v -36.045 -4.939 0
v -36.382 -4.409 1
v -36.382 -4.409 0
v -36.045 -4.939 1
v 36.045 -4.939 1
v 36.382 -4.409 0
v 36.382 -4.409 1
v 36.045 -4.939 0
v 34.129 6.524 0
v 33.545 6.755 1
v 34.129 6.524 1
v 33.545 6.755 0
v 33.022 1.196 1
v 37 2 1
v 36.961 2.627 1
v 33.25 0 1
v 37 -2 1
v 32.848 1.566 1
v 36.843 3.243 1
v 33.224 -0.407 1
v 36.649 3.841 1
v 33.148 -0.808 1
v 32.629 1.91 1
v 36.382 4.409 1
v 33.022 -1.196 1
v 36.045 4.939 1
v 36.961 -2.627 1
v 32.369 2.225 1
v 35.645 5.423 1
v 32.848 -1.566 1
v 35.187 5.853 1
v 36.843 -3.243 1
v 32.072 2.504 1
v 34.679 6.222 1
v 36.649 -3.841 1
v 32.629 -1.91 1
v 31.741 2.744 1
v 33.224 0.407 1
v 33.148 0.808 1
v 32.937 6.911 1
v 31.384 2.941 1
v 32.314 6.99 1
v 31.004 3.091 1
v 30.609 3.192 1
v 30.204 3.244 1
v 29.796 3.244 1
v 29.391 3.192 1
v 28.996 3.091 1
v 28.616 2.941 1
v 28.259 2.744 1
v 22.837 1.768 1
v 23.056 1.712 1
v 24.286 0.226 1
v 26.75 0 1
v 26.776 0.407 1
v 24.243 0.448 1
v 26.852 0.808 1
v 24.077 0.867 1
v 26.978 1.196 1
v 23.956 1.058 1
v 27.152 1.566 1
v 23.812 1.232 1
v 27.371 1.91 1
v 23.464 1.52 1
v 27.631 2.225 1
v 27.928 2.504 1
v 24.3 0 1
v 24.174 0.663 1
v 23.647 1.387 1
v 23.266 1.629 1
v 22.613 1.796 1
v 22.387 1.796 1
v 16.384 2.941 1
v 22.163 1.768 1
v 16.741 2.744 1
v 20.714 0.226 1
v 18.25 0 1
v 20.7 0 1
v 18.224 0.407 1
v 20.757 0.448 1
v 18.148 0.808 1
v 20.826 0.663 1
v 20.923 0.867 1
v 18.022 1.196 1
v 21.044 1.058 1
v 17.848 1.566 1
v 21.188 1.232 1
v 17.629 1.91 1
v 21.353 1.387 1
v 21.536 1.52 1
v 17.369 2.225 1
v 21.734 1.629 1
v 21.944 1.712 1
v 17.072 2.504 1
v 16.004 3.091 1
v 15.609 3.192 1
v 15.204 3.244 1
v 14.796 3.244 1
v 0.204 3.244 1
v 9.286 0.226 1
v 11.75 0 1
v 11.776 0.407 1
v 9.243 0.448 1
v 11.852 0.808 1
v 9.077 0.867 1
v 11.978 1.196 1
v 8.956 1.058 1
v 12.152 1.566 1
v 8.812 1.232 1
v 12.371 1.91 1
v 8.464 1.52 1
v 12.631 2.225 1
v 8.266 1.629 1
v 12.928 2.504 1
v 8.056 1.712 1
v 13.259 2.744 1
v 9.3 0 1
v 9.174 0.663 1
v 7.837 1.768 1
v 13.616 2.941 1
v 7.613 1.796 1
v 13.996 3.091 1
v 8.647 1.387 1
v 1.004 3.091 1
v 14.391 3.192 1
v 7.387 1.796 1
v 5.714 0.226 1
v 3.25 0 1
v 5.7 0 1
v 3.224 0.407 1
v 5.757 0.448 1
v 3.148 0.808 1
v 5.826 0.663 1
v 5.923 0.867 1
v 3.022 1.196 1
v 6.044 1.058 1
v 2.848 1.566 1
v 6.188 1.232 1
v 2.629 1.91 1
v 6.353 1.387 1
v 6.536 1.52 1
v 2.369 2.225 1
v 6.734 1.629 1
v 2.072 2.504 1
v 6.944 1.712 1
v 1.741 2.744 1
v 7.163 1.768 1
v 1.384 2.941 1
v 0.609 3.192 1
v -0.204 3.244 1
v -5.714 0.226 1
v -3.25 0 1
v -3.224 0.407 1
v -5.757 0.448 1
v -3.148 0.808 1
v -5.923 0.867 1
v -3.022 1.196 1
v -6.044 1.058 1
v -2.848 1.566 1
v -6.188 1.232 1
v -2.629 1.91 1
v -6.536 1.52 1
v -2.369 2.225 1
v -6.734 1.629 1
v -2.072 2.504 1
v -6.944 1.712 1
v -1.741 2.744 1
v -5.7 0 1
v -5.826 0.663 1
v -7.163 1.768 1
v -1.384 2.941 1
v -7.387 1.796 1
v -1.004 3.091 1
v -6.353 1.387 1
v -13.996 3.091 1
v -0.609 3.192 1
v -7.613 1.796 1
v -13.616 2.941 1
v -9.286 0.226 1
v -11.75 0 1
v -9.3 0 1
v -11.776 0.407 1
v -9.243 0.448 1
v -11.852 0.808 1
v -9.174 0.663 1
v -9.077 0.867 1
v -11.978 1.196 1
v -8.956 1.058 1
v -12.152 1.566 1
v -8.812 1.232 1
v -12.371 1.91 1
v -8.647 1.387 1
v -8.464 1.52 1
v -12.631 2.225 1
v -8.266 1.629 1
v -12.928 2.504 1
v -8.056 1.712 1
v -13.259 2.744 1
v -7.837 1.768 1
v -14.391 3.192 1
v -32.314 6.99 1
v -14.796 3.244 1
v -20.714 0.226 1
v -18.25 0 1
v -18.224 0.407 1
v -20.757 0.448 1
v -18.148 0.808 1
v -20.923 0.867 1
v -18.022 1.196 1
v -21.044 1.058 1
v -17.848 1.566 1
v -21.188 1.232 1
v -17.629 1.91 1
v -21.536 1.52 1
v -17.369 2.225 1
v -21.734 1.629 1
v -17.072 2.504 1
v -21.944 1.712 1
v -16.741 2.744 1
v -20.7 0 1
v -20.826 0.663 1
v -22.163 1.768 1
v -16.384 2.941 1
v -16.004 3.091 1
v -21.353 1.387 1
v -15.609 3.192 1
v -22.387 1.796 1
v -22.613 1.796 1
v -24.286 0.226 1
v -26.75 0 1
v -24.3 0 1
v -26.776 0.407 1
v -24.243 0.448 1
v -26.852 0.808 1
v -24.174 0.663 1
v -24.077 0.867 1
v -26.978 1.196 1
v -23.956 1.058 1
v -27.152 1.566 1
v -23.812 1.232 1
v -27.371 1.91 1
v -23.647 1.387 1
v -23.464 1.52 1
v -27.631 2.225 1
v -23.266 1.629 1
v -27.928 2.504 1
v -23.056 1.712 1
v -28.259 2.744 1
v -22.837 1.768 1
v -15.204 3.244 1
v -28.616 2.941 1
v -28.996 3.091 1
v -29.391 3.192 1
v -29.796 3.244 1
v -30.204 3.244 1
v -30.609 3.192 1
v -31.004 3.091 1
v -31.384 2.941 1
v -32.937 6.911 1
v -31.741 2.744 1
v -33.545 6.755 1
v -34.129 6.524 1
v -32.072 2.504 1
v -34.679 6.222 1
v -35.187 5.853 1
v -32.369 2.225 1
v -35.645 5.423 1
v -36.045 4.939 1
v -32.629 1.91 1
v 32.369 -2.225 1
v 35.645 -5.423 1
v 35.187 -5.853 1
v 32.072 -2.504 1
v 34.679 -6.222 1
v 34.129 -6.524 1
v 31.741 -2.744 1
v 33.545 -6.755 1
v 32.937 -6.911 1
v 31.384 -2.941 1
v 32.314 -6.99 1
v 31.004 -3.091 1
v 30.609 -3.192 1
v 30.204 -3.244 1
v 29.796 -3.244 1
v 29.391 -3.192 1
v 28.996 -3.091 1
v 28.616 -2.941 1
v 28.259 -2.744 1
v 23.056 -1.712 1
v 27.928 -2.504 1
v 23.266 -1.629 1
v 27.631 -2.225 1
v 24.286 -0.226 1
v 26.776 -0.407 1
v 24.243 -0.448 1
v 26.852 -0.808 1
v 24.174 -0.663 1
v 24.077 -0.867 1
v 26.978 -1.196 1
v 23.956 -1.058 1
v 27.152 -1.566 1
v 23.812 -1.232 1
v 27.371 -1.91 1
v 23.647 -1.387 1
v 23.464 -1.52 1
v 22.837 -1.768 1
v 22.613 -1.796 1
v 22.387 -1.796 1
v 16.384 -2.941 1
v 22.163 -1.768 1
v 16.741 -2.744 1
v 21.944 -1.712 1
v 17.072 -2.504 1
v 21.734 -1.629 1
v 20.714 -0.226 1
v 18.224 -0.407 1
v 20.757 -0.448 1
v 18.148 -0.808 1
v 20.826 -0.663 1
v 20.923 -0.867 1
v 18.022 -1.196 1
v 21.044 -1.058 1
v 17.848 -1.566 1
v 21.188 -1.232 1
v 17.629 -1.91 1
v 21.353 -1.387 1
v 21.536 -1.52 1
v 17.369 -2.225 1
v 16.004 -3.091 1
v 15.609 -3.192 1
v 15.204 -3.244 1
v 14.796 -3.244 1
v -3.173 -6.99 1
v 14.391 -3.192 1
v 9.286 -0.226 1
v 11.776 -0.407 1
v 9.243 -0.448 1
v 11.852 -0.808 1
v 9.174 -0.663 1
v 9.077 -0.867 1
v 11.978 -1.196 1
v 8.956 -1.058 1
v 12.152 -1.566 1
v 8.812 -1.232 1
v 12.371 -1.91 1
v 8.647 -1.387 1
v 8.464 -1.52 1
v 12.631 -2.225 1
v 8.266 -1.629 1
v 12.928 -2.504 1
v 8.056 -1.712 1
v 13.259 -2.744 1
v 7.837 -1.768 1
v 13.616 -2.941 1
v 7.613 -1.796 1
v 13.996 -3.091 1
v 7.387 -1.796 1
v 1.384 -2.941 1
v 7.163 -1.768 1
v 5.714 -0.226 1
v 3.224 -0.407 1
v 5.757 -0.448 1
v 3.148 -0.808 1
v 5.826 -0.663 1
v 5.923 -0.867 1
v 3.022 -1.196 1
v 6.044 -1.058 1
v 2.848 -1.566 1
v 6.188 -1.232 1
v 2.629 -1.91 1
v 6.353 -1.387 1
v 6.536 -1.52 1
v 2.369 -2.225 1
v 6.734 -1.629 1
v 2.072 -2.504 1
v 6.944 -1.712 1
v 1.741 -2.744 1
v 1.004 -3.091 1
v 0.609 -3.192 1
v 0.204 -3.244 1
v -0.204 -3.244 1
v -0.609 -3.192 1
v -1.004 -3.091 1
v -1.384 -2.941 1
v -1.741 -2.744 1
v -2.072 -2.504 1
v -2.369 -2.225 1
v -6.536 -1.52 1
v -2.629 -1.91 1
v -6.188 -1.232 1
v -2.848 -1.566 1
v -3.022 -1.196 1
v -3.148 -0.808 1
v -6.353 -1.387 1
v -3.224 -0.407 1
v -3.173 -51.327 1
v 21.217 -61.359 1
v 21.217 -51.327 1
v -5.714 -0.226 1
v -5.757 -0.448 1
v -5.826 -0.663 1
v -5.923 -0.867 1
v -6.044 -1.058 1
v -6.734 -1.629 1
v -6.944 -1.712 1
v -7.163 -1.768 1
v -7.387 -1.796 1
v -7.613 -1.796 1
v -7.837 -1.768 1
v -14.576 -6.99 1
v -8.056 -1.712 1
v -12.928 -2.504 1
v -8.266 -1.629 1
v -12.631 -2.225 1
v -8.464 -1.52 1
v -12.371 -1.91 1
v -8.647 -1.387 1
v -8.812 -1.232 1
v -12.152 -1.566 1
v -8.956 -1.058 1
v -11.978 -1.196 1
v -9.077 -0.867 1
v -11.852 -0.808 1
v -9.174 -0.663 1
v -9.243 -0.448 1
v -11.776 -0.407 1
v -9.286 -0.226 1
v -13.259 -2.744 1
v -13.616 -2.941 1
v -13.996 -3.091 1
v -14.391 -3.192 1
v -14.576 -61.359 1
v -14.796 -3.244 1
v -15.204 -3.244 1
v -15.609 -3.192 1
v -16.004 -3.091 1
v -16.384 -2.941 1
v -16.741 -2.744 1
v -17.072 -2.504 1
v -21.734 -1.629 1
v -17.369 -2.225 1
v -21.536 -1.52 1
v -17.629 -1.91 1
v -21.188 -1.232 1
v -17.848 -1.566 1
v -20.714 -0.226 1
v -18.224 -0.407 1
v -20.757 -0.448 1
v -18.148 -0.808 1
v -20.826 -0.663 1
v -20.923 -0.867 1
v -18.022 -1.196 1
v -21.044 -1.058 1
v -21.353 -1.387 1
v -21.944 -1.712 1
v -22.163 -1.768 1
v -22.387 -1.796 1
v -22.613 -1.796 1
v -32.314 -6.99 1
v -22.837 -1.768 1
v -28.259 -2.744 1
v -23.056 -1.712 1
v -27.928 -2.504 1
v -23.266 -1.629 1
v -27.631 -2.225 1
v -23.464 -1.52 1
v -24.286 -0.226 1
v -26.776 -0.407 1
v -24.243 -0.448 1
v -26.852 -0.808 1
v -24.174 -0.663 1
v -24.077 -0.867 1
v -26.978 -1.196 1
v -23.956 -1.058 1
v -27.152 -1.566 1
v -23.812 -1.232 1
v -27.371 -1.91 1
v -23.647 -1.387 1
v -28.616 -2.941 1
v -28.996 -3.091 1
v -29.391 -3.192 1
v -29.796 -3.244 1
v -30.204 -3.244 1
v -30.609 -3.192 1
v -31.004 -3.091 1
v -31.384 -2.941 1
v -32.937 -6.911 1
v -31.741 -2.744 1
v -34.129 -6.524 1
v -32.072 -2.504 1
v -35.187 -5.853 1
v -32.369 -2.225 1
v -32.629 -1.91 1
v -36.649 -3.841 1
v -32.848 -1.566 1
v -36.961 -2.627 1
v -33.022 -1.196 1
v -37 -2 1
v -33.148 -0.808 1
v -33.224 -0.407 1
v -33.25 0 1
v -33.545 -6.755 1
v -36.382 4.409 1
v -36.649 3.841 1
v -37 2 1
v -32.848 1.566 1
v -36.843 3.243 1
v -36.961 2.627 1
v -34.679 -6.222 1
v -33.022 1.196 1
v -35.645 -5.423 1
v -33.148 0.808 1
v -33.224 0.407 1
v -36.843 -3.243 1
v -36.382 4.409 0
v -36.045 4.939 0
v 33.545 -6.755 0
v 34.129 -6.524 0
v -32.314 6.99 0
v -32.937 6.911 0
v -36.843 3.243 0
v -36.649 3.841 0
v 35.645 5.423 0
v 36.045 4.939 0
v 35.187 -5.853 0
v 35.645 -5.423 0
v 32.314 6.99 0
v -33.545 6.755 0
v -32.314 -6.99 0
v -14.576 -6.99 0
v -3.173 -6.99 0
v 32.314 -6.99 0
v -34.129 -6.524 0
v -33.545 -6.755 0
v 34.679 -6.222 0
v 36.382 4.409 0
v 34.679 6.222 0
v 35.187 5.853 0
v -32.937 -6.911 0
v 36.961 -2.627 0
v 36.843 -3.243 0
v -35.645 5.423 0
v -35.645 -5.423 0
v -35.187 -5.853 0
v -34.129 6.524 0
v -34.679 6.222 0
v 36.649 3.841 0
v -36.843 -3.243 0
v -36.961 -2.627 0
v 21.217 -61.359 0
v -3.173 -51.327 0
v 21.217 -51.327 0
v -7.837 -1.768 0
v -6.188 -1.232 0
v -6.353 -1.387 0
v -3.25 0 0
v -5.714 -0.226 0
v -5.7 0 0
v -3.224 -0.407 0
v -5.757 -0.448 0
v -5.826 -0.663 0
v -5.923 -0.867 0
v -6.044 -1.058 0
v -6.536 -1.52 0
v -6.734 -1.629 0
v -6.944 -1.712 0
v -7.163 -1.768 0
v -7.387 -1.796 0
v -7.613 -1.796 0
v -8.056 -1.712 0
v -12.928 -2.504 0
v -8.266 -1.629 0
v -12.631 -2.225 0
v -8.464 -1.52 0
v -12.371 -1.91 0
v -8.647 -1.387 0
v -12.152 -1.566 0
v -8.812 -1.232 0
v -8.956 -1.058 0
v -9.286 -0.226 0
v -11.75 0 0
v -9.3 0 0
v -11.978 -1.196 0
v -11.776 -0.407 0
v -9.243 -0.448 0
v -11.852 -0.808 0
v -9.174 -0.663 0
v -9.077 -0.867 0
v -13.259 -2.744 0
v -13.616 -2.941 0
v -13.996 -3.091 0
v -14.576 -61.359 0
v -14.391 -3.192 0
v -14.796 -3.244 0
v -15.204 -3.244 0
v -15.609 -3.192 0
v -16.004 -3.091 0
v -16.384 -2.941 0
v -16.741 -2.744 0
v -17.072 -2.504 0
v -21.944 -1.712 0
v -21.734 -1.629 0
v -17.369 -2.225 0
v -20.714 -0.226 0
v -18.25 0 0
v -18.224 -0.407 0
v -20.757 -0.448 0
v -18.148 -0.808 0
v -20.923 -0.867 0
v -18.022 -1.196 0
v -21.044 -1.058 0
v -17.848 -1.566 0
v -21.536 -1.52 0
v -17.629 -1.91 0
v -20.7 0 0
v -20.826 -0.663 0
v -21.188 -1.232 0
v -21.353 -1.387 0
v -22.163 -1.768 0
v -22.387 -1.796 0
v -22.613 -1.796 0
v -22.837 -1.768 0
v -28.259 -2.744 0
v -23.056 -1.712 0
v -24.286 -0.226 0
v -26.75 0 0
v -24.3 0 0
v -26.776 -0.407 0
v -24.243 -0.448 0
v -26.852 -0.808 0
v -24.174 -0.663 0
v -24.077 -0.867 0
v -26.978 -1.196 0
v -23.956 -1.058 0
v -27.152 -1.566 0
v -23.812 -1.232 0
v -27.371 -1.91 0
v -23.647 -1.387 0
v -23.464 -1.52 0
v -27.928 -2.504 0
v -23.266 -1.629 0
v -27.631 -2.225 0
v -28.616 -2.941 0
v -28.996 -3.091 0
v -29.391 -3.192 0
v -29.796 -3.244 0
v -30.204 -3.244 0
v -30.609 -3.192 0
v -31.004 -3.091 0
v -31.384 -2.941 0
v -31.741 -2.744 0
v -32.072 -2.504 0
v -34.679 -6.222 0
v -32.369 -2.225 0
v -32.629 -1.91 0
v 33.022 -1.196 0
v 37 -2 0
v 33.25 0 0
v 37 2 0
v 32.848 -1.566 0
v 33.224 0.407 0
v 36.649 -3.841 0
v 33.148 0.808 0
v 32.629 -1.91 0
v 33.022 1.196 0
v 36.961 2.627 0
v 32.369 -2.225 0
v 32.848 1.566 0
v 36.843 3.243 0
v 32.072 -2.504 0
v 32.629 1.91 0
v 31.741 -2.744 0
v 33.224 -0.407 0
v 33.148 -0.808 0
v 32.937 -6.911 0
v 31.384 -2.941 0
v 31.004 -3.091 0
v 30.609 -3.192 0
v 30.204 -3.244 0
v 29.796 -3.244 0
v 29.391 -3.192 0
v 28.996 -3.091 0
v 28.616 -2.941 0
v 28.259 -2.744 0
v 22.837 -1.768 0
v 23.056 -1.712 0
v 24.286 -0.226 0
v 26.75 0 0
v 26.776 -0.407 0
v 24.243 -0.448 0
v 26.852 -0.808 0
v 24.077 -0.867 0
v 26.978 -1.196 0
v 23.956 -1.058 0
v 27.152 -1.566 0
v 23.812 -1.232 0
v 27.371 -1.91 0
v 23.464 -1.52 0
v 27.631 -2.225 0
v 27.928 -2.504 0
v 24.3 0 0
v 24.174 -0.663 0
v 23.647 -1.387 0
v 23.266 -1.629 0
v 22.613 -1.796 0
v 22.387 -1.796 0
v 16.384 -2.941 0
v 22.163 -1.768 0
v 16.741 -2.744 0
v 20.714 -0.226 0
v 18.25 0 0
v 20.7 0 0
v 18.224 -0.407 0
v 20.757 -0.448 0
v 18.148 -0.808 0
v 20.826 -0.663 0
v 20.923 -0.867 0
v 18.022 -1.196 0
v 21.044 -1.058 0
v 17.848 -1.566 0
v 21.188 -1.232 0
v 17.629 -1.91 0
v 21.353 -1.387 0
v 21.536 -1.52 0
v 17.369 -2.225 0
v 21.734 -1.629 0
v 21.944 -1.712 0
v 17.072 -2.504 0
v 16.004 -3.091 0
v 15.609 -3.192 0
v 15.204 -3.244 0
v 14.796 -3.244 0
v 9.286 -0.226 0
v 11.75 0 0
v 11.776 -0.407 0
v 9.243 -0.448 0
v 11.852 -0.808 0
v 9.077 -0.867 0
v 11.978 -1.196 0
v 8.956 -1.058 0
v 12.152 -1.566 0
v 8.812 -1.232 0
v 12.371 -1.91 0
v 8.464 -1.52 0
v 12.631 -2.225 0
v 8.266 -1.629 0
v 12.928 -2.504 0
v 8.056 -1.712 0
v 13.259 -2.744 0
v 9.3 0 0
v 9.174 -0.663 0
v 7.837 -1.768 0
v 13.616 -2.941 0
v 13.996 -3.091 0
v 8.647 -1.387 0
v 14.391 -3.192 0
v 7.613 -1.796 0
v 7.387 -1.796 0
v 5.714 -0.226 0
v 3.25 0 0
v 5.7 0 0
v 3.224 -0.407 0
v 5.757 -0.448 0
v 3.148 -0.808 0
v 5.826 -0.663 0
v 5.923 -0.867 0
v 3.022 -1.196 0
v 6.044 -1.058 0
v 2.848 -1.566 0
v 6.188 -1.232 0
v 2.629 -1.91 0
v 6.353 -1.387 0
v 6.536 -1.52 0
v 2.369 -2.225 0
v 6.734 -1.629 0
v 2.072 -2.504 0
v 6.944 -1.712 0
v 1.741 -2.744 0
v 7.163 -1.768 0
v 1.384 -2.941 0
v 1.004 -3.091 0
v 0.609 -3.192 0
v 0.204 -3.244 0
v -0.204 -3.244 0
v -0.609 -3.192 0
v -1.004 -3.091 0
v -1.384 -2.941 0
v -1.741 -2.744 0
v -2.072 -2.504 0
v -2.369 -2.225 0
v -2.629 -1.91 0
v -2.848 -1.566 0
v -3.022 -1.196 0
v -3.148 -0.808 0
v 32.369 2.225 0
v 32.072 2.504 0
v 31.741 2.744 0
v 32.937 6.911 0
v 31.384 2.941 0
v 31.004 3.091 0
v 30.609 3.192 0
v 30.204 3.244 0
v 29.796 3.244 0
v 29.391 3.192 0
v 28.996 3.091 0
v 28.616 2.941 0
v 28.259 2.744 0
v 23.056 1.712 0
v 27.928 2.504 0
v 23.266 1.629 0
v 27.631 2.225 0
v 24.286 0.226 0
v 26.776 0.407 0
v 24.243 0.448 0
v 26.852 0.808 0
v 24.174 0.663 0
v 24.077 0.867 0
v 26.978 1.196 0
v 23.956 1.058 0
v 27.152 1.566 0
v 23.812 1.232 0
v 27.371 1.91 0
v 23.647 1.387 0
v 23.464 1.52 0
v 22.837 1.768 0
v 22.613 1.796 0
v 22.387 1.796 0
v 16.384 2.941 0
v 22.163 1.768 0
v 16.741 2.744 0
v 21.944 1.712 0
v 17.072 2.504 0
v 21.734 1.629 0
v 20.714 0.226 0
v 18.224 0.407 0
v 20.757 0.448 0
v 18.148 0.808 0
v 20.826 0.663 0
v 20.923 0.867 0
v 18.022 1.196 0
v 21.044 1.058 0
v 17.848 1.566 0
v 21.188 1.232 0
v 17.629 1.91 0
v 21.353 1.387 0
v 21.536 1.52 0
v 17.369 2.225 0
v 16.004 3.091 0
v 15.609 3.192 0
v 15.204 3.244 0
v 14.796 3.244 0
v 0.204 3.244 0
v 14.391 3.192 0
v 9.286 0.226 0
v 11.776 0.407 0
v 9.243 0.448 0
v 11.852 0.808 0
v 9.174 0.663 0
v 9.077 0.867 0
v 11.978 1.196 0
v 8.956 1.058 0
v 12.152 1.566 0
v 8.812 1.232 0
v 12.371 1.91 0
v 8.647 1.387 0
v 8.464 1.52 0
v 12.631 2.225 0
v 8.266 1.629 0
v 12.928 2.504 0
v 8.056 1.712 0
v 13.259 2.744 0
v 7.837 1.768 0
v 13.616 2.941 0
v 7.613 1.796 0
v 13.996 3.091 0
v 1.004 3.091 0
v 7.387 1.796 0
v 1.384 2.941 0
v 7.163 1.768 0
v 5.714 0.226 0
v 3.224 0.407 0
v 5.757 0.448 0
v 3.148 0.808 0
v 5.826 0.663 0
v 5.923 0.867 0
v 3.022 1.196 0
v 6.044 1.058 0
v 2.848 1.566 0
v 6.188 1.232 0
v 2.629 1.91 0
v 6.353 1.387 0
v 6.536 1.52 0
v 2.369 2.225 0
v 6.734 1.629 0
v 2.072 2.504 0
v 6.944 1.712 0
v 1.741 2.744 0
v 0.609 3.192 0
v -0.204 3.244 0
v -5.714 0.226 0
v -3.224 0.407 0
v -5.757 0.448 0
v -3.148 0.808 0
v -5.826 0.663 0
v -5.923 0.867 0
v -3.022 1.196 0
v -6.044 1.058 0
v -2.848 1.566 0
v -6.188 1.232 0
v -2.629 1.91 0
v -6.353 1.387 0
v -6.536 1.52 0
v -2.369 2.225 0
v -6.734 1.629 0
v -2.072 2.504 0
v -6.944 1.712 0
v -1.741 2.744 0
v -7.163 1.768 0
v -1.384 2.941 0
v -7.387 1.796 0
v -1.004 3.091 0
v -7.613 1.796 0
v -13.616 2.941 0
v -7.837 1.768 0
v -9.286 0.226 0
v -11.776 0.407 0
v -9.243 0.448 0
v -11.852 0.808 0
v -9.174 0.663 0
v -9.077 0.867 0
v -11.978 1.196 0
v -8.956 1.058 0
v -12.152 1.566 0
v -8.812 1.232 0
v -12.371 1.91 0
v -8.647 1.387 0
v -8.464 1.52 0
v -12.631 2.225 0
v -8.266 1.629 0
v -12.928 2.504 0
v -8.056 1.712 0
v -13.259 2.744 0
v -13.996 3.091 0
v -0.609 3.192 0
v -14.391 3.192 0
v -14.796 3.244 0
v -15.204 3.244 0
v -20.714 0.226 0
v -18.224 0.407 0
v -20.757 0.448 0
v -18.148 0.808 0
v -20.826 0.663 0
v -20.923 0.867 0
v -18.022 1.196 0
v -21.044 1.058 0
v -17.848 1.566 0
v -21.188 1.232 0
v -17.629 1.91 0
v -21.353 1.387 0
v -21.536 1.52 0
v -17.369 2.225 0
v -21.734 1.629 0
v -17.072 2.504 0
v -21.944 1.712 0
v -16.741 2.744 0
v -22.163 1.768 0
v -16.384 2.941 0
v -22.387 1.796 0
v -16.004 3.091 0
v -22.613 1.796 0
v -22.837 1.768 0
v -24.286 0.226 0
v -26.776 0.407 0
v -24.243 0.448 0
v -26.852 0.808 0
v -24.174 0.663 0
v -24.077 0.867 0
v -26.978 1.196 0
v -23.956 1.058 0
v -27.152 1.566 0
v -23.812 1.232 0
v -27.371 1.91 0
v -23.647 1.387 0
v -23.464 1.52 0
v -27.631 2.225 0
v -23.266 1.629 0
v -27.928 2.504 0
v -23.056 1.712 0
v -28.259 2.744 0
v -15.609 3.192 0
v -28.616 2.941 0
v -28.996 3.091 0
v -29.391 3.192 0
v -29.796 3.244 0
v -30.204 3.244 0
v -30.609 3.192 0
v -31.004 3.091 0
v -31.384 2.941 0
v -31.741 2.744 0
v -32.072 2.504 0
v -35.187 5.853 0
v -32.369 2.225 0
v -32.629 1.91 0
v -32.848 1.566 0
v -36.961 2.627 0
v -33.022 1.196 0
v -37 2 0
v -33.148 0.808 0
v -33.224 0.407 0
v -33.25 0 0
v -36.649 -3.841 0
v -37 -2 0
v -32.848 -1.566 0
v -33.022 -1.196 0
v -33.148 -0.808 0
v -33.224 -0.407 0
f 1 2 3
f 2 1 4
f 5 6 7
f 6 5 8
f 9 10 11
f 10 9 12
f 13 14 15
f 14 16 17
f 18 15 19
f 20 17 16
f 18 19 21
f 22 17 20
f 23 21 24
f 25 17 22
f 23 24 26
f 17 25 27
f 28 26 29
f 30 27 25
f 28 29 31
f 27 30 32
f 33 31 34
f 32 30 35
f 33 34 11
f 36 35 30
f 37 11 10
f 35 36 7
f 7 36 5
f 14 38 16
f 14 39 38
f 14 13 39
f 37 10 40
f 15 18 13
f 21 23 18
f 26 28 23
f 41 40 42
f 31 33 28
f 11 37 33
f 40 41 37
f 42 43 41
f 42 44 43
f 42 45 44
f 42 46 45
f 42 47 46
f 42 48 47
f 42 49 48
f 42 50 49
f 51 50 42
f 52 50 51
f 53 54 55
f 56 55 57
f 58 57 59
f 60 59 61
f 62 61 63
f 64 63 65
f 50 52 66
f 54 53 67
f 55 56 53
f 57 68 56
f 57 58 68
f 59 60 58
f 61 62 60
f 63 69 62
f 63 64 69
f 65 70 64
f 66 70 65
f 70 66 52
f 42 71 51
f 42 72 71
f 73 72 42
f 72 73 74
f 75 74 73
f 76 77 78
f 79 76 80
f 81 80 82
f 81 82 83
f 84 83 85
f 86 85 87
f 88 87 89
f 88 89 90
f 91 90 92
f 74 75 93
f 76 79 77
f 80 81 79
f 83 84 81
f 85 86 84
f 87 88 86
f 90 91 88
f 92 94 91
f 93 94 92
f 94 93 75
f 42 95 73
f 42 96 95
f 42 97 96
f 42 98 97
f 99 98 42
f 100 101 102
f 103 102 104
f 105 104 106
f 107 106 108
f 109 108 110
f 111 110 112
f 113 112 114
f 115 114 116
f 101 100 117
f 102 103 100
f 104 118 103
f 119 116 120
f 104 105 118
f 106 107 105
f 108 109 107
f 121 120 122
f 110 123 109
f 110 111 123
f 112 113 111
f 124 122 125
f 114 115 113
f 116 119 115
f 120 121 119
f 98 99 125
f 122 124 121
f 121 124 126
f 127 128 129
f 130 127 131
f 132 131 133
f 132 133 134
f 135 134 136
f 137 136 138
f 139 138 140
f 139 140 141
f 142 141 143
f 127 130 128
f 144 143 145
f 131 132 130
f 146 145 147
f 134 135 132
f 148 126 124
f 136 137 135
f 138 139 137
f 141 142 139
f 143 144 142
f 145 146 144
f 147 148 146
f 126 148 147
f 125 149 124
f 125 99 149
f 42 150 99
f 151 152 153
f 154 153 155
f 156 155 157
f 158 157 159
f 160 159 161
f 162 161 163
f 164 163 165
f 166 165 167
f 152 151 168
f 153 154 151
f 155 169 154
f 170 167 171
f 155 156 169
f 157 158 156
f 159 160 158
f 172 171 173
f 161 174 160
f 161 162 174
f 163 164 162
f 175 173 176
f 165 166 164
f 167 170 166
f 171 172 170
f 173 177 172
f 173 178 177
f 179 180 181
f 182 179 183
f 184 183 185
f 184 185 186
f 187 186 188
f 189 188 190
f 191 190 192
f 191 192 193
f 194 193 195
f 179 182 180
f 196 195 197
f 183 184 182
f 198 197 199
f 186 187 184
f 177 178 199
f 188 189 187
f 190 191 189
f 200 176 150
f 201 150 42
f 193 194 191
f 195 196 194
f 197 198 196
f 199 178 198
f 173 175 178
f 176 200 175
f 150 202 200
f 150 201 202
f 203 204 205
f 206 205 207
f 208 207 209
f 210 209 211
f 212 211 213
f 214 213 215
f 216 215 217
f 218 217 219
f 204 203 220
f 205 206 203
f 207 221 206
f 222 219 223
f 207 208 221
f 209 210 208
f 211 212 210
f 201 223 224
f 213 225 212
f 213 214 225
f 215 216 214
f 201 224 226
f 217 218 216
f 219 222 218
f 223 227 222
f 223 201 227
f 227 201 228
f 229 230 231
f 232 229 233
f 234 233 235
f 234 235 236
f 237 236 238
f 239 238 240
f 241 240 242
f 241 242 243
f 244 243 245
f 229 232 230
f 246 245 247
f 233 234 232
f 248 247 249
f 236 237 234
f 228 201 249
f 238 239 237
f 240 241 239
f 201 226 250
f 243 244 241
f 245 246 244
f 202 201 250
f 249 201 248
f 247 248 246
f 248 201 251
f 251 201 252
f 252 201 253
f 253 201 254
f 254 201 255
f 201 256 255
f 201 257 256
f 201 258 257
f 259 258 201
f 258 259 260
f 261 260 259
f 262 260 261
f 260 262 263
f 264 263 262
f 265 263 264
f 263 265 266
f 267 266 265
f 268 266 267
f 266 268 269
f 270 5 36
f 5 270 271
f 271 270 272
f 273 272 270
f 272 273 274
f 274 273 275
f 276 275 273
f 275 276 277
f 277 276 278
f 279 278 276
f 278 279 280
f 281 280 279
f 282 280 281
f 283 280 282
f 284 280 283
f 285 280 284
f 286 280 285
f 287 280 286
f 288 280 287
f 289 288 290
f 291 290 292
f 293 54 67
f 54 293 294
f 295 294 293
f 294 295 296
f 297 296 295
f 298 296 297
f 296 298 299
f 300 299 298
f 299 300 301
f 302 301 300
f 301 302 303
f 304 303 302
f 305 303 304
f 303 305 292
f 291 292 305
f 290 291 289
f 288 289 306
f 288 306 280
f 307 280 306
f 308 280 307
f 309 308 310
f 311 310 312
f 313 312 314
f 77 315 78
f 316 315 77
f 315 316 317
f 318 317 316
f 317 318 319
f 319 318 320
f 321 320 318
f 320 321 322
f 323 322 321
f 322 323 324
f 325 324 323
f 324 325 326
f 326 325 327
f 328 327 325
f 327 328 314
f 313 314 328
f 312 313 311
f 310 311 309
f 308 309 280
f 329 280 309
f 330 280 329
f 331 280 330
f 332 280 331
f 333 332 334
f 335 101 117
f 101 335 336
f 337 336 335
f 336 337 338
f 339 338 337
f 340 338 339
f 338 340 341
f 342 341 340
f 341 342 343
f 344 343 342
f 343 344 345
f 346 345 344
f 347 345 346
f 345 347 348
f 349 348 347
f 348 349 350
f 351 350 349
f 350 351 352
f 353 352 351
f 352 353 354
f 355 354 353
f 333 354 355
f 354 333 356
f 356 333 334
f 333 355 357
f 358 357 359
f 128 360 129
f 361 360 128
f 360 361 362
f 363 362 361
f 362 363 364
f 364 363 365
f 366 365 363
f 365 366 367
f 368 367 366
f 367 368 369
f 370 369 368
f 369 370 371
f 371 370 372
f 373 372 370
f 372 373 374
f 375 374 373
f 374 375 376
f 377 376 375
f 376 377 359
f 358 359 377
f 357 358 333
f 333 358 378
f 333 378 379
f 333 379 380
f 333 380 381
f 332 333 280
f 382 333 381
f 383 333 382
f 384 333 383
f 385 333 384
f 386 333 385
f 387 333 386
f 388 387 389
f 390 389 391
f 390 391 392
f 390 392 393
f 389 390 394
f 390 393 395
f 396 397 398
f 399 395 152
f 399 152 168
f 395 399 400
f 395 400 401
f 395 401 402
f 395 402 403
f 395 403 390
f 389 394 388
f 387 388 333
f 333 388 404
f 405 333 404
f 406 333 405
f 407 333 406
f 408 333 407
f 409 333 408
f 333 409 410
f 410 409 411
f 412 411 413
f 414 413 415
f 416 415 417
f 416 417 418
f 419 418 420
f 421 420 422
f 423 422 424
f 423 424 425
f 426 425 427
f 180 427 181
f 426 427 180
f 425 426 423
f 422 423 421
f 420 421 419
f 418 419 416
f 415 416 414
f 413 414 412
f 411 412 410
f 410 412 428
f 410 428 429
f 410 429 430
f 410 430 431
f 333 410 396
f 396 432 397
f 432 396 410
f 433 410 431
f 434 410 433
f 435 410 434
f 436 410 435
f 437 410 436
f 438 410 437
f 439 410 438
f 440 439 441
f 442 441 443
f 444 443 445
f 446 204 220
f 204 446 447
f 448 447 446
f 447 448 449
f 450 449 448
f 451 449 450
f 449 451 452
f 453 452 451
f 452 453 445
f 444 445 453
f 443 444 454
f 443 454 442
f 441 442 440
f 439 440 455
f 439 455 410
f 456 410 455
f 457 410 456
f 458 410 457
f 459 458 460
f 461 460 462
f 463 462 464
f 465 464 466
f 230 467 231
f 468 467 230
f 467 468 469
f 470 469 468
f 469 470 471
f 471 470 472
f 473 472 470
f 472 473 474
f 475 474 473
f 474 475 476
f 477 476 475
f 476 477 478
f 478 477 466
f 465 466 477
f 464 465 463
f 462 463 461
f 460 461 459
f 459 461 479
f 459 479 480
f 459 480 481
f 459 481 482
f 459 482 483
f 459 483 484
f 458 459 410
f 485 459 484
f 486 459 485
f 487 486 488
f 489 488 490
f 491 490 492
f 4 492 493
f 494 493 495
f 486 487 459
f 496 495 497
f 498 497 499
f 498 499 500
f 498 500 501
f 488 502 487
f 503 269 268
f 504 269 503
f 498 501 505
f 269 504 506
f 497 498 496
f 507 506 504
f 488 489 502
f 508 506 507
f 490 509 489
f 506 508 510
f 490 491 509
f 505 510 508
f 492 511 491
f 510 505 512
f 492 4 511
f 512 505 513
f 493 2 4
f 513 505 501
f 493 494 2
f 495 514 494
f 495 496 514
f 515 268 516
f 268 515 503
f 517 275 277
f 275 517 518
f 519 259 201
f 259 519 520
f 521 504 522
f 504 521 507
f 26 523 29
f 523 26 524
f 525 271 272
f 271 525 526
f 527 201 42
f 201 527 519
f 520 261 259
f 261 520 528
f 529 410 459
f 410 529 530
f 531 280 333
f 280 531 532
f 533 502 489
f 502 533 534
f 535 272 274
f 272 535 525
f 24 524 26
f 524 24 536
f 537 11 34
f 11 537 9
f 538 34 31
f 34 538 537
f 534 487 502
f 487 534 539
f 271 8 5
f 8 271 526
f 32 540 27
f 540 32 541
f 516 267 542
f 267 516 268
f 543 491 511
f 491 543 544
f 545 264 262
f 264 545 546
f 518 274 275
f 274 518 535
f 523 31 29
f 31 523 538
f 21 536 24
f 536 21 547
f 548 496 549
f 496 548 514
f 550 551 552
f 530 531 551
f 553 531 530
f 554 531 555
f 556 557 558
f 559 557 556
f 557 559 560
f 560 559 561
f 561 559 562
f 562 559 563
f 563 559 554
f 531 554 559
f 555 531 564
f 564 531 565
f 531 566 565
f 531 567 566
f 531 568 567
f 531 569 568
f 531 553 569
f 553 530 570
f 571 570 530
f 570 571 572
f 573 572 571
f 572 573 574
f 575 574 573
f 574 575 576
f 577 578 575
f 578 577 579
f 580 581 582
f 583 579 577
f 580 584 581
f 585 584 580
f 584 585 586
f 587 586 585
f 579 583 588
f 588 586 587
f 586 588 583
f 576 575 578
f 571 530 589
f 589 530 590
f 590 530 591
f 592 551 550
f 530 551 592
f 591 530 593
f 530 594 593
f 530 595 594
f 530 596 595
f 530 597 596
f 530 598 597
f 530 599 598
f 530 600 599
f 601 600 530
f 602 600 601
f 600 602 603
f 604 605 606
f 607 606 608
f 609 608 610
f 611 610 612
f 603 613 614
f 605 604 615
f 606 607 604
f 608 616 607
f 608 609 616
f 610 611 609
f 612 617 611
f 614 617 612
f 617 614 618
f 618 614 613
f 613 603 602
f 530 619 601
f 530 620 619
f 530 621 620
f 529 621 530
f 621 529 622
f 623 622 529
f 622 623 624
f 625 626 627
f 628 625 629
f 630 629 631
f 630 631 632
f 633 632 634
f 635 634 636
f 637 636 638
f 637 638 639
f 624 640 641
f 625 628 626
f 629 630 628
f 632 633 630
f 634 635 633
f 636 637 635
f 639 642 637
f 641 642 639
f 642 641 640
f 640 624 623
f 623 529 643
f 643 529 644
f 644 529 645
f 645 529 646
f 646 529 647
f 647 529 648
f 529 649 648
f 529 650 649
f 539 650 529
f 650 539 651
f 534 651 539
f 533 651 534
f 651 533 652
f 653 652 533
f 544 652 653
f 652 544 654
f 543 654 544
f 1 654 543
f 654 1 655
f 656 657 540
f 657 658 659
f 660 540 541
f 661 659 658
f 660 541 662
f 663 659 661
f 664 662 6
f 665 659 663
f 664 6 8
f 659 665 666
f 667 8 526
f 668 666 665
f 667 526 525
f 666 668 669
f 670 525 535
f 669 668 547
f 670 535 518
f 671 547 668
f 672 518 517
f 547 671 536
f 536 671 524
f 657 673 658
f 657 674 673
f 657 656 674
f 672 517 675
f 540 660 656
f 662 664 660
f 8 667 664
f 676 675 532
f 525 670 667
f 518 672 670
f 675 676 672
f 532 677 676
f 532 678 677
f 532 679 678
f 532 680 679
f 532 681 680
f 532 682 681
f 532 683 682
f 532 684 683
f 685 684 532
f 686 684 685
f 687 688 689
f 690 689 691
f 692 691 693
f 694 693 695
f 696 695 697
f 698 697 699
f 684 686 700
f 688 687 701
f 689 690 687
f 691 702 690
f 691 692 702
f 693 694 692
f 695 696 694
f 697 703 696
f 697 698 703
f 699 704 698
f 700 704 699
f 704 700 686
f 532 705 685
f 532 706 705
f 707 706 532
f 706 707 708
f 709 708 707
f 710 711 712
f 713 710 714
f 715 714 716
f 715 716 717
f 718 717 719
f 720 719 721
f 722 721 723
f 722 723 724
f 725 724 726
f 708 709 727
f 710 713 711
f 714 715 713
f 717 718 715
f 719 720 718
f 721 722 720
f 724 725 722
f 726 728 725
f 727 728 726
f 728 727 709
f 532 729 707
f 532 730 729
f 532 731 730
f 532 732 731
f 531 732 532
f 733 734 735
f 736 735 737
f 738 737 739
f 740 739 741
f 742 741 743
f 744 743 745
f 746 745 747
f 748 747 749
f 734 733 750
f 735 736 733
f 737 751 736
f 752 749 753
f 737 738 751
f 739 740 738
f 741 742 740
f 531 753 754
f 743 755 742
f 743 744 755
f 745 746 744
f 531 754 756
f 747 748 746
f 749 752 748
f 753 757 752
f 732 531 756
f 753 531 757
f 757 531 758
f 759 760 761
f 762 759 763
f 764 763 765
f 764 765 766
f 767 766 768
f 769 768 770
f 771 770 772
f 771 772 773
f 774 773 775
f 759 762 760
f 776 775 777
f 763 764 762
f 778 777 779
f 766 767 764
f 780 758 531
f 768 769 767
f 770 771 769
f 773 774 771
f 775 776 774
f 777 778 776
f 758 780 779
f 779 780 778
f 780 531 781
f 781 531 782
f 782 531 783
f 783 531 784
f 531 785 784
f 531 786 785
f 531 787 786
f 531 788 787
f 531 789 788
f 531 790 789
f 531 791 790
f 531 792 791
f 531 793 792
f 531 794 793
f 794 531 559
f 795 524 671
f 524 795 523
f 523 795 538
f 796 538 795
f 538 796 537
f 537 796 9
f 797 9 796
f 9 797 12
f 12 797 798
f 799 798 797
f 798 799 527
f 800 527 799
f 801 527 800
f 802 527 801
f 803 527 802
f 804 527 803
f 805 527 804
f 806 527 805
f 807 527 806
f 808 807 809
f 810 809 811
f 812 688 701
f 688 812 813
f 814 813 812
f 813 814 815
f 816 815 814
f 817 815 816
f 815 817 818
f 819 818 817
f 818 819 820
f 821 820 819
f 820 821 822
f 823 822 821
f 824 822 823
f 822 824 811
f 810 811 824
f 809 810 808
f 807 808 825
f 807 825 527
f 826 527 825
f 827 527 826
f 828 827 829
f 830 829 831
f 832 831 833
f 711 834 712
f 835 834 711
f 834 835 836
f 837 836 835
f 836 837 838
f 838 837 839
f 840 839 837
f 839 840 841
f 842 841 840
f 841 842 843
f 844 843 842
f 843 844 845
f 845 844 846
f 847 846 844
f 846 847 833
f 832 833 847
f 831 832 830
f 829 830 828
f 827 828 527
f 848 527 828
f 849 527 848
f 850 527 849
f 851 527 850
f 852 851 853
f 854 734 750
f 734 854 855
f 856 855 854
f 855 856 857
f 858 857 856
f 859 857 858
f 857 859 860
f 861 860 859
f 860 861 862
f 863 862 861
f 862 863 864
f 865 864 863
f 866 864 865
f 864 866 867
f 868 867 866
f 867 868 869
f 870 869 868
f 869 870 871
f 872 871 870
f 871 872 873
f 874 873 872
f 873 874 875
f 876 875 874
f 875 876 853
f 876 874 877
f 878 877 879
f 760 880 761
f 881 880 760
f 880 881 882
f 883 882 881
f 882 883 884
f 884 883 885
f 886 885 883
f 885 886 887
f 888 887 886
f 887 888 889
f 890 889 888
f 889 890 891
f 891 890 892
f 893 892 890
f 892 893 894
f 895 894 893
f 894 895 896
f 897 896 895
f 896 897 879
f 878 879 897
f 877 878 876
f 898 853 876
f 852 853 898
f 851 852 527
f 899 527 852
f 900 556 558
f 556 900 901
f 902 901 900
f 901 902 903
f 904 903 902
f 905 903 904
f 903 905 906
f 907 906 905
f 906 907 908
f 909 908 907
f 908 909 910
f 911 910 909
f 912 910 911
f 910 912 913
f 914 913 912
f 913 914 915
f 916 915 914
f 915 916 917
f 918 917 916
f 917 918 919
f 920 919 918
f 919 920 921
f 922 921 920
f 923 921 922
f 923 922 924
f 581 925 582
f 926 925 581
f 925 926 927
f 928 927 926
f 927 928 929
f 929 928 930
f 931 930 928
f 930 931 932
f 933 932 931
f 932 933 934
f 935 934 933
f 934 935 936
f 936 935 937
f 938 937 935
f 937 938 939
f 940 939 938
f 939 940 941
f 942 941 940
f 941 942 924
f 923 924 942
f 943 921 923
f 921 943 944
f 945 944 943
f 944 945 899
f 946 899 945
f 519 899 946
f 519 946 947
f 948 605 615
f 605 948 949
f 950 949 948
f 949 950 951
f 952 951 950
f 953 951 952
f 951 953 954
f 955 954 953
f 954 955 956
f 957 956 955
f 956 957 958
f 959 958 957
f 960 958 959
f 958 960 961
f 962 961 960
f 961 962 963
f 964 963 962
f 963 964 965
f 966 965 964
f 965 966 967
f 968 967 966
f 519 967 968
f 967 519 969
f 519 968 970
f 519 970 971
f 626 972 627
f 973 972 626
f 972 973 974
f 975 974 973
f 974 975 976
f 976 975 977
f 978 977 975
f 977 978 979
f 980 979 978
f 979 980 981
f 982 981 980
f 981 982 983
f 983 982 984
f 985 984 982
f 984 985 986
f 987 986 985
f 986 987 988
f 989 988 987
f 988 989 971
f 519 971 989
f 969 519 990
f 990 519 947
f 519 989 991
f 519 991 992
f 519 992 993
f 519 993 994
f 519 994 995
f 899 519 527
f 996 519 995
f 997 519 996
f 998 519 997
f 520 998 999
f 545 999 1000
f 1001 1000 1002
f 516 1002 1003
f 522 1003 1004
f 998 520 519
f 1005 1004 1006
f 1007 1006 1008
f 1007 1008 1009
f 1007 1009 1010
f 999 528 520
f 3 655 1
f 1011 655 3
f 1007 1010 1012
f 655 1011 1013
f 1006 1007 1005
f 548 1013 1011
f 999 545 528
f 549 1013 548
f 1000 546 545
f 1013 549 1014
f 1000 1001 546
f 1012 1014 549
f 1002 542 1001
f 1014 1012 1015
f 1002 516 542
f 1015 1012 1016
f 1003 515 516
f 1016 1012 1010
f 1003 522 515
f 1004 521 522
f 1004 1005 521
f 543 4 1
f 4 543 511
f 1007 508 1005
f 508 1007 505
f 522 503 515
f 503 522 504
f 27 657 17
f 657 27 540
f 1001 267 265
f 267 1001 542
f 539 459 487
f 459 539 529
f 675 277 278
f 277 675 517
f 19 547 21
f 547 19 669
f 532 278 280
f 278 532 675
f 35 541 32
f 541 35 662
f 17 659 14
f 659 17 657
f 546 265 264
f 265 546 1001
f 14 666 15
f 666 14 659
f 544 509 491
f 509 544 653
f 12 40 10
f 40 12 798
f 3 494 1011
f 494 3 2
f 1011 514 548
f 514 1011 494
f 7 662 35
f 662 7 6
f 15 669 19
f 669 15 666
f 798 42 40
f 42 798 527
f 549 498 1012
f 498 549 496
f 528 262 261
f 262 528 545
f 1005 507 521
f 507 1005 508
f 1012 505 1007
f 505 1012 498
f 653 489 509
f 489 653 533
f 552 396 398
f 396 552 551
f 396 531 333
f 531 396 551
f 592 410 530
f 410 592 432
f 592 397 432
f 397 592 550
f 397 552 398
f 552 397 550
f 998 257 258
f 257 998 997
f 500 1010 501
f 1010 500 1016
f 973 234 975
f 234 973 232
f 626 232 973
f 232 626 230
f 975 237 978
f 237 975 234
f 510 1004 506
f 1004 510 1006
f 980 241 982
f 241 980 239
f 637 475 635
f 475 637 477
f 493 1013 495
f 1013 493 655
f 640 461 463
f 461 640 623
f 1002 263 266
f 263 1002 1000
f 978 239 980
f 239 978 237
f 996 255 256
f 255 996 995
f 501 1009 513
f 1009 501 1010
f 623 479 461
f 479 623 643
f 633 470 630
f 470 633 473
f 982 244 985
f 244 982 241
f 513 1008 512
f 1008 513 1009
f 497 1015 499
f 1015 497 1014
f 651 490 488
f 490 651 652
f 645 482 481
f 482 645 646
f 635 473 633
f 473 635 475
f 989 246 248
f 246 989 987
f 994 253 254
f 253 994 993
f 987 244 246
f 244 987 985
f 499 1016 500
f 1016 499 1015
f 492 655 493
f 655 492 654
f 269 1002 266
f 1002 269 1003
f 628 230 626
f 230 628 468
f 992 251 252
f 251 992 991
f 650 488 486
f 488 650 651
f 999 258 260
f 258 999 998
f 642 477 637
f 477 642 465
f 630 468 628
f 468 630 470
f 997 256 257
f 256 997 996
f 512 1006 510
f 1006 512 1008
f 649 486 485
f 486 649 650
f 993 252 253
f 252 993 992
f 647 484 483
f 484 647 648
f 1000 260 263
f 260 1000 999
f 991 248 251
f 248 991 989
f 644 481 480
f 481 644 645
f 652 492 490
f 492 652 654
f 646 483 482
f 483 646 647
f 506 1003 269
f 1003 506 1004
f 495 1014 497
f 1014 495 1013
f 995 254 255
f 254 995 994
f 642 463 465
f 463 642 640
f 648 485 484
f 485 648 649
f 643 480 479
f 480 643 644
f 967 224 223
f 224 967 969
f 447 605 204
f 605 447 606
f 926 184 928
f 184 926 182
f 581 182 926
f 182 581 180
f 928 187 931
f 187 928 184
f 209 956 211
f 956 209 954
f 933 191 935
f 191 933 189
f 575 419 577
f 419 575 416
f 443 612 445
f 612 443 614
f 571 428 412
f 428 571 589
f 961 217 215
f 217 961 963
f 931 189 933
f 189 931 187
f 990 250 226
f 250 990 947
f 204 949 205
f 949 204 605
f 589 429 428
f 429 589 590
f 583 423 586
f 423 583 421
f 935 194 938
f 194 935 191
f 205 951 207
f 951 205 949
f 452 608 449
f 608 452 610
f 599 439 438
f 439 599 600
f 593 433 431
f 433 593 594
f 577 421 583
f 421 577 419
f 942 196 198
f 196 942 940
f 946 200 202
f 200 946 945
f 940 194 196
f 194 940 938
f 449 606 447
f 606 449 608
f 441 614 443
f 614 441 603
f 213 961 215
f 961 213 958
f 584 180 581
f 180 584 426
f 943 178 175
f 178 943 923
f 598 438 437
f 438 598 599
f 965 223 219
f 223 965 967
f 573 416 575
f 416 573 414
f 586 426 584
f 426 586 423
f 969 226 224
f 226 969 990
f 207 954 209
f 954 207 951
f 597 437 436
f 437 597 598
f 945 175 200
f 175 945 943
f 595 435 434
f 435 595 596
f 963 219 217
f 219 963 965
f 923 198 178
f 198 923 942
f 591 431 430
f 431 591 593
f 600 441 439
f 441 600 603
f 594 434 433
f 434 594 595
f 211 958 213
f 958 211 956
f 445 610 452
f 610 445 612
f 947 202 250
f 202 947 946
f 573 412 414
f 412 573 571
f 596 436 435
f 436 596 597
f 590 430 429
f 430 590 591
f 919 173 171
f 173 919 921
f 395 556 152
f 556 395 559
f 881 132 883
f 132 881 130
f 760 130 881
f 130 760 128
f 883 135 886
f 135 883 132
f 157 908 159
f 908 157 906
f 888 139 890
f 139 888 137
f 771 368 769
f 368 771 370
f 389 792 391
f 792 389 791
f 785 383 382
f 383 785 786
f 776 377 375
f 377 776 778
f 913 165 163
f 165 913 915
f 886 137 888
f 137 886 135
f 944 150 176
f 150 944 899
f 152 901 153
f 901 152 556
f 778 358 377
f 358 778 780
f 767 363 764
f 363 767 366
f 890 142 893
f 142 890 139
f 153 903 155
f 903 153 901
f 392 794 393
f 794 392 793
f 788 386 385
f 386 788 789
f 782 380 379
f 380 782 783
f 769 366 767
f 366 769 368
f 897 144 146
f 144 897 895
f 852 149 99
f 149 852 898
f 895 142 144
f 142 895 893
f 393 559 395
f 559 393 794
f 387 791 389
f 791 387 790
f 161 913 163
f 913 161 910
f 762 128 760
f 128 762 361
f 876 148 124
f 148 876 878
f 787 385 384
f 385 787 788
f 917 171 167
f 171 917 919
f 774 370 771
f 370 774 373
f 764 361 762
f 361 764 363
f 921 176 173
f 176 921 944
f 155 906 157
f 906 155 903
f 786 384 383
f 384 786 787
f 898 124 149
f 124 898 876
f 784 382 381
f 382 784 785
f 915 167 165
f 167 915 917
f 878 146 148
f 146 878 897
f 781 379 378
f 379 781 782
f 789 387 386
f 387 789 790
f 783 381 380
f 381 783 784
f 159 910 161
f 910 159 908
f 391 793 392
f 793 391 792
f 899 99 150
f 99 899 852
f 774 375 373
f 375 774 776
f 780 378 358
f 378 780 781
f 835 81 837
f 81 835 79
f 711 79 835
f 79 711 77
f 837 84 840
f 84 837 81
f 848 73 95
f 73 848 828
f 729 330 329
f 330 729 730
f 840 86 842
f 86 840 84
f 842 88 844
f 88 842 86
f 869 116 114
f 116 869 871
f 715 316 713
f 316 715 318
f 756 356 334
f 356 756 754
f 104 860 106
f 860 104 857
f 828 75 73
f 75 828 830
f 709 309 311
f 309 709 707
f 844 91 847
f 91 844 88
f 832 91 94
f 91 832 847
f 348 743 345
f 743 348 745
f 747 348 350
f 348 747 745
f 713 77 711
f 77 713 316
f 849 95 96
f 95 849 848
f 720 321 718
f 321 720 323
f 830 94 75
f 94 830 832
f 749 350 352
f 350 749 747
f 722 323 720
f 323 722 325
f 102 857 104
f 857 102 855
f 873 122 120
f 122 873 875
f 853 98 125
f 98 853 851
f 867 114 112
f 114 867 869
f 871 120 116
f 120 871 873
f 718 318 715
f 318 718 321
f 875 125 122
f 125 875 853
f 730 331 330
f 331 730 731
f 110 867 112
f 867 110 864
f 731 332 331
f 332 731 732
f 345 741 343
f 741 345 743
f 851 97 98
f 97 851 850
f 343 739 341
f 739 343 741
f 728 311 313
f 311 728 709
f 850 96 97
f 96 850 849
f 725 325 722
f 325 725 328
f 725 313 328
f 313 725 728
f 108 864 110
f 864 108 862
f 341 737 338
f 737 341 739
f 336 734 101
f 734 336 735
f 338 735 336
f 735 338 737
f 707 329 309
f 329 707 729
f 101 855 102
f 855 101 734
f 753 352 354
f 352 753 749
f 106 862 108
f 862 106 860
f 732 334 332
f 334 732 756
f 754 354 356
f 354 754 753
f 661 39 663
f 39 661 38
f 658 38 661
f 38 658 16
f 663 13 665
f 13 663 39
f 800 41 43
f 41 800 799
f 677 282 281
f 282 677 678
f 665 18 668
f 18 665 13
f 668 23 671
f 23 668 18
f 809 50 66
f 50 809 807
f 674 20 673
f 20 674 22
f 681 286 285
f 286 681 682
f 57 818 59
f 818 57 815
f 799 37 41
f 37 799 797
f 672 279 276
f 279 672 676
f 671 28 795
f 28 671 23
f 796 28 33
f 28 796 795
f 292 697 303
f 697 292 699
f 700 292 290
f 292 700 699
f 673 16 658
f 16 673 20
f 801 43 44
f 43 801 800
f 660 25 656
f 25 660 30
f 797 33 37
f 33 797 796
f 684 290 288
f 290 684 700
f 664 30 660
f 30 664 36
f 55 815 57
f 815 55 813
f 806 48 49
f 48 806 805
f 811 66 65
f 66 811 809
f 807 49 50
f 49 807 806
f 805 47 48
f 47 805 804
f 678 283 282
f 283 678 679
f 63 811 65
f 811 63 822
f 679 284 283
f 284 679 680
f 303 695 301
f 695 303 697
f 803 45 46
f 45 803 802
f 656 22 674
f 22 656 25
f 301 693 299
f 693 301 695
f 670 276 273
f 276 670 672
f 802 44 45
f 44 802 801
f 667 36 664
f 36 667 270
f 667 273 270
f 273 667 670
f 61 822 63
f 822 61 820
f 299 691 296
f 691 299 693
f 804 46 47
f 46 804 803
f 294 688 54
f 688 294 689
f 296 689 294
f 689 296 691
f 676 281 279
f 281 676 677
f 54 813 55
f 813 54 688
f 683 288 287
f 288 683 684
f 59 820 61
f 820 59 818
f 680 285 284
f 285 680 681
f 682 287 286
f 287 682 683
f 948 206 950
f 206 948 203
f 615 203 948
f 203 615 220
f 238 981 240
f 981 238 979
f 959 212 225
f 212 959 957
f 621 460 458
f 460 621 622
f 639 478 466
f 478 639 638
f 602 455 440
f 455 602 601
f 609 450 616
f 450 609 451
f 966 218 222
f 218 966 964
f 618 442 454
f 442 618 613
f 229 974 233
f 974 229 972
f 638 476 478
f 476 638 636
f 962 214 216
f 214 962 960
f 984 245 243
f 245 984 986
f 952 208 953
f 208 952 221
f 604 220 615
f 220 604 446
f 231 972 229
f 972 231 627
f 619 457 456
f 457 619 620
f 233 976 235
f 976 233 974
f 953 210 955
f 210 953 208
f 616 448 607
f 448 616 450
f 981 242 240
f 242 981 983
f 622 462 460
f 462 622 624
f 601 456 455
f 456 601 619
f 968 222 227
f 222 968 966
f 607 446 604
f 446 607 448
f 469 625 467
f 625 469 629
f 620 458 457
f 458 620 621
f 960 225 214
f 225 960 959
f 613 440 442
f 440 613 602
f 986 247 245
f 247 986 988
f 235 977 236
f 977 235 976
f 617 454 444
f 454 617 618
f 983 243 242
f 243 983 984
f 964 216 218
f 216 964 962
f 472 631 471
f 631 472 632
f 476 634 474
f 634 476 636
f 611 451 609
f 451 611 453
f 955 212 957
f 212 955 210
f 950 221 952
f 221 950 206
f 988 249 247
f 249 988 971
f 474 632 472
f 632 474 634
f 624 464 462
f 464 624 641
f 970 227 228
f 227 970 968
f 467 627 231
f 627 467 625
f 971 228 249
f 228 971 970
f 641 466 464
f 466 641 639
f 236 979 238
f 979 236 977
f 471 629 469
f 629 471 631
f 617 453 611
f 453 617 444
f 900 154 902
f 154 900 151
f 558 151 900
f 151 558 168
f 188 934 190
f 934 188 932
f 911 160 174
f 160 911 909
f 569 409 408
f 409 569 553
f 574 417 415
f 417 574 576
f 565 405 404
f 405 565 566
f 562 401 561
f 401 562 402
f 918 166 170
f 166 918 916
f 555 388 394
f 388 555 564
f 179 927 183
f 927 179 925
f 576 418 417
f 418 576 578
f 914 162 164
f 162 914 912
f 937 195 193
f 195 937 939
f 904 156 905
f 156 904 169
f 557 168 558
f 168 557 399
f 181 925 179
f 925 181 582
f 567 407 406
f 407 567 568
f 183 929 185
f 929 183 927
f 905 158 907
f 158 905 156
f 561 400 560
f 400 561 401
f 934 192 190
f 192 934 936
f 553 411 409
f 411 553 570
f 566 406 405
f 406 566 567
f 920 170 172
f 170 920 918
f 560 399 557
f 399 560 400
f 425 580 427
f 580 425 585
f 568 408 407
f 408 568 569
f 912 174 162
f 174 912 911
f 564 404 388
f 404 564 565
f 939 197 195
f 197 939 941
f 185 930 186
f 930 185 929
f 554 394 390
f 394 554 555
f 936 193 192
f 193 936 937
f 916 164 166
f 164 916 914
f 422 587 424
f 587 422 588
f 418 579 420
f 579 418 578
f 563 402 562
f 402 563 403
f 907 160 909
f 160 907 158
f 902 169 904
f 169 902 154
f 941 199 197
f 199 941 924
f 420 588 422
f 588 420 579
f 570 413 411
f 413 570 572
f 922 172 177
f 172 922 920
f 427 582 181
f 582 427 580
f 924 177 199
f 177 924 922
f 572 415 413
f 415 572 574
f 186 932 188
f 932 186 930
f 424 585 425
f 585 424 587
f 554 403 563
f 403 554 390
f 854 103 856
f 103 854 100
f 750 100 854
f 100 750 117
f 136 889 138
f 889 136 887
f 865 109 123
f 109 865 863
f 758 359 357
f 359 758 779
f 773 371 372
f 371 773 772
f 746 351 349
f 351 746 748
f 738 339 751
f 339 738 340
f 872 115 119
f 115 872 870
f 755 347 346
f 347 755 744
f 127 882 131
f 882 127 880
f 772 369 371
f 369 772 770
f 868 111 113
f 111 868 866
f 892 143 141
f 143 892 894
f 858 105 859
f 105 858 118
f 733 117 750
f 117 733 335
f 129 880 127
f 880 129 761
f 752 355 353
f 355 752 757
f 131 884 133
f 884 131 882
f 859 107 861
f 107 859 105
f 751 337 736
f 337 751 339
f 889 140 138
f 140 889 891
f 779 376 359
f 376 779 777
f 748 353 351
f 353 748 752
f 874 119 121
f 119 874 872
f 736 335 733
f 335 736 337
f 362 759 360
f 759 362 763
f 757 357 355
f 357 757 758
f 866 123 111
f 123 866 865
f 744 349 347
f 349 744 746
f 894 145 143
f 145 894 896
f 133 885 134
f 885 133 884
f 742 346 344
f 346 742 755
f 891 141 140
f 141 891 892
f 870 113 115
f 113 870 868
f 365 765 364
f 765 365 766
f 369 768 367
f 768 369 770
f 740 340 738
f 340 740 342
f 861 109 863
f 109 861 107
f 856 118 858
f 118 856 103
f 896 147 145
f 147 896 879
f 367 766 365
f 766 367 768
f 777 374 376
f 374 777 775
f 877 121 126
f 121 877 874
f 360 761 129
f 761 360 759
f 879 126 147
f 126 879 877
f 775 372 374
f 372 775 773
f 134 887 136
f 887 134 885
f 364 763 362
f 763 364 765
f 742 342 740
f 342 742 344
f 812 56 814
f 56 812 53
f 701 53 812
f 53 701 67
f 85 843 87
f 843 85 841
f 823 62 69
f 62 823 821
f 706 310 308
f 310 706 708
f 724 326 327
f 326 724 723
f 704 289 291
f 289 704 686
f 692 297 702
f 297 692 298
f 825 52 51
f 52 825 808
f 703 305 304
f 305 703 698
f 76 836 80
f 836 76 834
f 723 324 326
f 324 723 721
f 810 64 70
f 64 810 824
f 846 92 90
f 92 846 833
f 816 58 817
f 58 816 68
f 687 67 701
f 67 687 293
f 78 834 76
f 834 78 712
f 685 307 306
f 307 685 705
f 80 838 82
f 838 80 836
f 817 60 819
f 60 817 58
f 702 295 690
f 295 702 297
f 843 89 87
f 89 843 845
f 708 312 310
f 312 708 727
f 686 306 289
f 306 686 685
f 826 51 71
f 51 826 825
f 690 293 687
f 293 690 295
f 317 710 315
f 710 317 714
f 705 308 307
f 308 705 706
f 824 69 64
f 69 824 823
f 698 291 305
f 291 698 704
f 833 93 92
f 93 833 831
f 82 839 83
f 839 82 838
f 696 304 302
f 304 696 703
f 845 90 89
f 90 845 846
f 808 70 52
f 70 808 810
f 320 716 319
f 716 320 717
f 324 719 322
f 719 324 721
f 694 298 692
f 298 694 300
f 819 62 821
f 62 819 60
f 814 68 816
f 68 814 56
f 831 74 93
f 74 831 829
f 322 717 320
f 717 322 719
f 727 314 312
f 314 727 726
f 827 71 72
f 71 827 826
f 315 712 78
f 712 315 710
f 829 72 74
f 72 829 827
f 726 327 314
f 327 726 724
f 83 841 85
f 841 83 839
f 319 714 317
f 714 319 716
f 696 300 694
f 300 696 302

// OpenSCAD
$fn = 50;


difference() {
	union() {
		hull() {
			translate(v = [-32.0000000000, 2.0000000000, 0]) {
				cylinder(h = 1, r = 5);
			}
			translate(v = [32.0000000000, 2.0000000000, 0]) {
				cylinder(h = 1, r = 5);
			}
			translate(v = [-32.0000000000, -2.0000000000, 0]) {
				cylinder(h = 1, r = 5);
			}
			translate(v = [32.0000000000, -2.0000000000, 0]) {
				cylinder(h = 1, r = 5);
			}
		}
		translate(v = [0, -5, 0]) {
			linear_extrude(height = 1) {
				text(font = "DejaVu Sans Mono:style=Bold", halign = "center", size = 57.0000000000, text = "L", valign = "top");
			}
		}
	}
	union() {
		translate(v = [-30.0000000000, 0.0000000000, 0]) {
			translate(v = [0, 0, -100]) {
				cylinder(h = 200, r = 3.2500000000);
			}
		}
		translate(v = [-15.0000000000, 0.0000000000, 0]) {
			translate(v = [0, 0, -100]) {
				cylinder(h = 200, r = 3.2500000000);
			}
		}
		translate(v = [0, 0, -100]) {
			cylinder(h = 200, r = 3.2500000000);
		}
		translate(v = [15.0000000000, 0.0000000000, 0]) {
			translate(v = [0, 0, -100]) {
				cylinder(h = 200, r = 3.2500000000);
			}
		}
		translate(v = [30.0000000000, 0.0000000000, 0]) {
			translate(v = [0, 0, -100]) {
				cylinder(h = 200, r = 3.2500000000);
			}
		}
		translate(v = [-30.0000000000, 0.0000000000, 0]) {
			translate(v = [0, 0, -100]) {
				cylinder(h = 200, r = 1.8000000000);
			}
		}
		translate(v = [-22.5000000000, 0.0000000000, 0]) {
			translate(v = [0, 0, -100]) {
				cylinder(h = 200, r = 1.8000000000);
			}
		}
		translate(v = [-15.0000000000, 0.0000000000, 0]) {
			translate(v = [0, 0, -100]) {
				cylinder(h = 200, r = 1.8000000000);
			}
		}
		translate(v = [-7.5000000000, 0.0000000000, 0]) {
			translate(v = [0, 0, -100]) {
				cylinder(h = 200, r = 1.8000000000);
			}
		}
		translate(v = [0, 0, -100]) {
			cylinder(h = 200, r = 1.8000000000);
		}
		translate(v = [7.5000000000, 0.0000000000, 0]) {
			translate(v = [0, 0, -100]) {
				cylinder(h = 200, r = 1.8000000000);
			}
		}
		translate(v = [15.0000000000, 0.0000000000, 0]) {
			translate(v = [0, 0, -100]) {
				cylinder(h = 200, r = 1.8000000000);
			}
		}
		translate(v = [22.5000000000, 0.0000000000, 0]) {
			translate(v = [0, 0, -100]) {
				cylinder(h = 200, r = 1.8000000000);
			}
		}
		translate(v = [30.0000000000, 0.0000000000, 0]) {
			translate(v = [0, 0, -100]) {
				cylinder(h = 200, r = 1.8000000000);
			}
		}
	}
}
